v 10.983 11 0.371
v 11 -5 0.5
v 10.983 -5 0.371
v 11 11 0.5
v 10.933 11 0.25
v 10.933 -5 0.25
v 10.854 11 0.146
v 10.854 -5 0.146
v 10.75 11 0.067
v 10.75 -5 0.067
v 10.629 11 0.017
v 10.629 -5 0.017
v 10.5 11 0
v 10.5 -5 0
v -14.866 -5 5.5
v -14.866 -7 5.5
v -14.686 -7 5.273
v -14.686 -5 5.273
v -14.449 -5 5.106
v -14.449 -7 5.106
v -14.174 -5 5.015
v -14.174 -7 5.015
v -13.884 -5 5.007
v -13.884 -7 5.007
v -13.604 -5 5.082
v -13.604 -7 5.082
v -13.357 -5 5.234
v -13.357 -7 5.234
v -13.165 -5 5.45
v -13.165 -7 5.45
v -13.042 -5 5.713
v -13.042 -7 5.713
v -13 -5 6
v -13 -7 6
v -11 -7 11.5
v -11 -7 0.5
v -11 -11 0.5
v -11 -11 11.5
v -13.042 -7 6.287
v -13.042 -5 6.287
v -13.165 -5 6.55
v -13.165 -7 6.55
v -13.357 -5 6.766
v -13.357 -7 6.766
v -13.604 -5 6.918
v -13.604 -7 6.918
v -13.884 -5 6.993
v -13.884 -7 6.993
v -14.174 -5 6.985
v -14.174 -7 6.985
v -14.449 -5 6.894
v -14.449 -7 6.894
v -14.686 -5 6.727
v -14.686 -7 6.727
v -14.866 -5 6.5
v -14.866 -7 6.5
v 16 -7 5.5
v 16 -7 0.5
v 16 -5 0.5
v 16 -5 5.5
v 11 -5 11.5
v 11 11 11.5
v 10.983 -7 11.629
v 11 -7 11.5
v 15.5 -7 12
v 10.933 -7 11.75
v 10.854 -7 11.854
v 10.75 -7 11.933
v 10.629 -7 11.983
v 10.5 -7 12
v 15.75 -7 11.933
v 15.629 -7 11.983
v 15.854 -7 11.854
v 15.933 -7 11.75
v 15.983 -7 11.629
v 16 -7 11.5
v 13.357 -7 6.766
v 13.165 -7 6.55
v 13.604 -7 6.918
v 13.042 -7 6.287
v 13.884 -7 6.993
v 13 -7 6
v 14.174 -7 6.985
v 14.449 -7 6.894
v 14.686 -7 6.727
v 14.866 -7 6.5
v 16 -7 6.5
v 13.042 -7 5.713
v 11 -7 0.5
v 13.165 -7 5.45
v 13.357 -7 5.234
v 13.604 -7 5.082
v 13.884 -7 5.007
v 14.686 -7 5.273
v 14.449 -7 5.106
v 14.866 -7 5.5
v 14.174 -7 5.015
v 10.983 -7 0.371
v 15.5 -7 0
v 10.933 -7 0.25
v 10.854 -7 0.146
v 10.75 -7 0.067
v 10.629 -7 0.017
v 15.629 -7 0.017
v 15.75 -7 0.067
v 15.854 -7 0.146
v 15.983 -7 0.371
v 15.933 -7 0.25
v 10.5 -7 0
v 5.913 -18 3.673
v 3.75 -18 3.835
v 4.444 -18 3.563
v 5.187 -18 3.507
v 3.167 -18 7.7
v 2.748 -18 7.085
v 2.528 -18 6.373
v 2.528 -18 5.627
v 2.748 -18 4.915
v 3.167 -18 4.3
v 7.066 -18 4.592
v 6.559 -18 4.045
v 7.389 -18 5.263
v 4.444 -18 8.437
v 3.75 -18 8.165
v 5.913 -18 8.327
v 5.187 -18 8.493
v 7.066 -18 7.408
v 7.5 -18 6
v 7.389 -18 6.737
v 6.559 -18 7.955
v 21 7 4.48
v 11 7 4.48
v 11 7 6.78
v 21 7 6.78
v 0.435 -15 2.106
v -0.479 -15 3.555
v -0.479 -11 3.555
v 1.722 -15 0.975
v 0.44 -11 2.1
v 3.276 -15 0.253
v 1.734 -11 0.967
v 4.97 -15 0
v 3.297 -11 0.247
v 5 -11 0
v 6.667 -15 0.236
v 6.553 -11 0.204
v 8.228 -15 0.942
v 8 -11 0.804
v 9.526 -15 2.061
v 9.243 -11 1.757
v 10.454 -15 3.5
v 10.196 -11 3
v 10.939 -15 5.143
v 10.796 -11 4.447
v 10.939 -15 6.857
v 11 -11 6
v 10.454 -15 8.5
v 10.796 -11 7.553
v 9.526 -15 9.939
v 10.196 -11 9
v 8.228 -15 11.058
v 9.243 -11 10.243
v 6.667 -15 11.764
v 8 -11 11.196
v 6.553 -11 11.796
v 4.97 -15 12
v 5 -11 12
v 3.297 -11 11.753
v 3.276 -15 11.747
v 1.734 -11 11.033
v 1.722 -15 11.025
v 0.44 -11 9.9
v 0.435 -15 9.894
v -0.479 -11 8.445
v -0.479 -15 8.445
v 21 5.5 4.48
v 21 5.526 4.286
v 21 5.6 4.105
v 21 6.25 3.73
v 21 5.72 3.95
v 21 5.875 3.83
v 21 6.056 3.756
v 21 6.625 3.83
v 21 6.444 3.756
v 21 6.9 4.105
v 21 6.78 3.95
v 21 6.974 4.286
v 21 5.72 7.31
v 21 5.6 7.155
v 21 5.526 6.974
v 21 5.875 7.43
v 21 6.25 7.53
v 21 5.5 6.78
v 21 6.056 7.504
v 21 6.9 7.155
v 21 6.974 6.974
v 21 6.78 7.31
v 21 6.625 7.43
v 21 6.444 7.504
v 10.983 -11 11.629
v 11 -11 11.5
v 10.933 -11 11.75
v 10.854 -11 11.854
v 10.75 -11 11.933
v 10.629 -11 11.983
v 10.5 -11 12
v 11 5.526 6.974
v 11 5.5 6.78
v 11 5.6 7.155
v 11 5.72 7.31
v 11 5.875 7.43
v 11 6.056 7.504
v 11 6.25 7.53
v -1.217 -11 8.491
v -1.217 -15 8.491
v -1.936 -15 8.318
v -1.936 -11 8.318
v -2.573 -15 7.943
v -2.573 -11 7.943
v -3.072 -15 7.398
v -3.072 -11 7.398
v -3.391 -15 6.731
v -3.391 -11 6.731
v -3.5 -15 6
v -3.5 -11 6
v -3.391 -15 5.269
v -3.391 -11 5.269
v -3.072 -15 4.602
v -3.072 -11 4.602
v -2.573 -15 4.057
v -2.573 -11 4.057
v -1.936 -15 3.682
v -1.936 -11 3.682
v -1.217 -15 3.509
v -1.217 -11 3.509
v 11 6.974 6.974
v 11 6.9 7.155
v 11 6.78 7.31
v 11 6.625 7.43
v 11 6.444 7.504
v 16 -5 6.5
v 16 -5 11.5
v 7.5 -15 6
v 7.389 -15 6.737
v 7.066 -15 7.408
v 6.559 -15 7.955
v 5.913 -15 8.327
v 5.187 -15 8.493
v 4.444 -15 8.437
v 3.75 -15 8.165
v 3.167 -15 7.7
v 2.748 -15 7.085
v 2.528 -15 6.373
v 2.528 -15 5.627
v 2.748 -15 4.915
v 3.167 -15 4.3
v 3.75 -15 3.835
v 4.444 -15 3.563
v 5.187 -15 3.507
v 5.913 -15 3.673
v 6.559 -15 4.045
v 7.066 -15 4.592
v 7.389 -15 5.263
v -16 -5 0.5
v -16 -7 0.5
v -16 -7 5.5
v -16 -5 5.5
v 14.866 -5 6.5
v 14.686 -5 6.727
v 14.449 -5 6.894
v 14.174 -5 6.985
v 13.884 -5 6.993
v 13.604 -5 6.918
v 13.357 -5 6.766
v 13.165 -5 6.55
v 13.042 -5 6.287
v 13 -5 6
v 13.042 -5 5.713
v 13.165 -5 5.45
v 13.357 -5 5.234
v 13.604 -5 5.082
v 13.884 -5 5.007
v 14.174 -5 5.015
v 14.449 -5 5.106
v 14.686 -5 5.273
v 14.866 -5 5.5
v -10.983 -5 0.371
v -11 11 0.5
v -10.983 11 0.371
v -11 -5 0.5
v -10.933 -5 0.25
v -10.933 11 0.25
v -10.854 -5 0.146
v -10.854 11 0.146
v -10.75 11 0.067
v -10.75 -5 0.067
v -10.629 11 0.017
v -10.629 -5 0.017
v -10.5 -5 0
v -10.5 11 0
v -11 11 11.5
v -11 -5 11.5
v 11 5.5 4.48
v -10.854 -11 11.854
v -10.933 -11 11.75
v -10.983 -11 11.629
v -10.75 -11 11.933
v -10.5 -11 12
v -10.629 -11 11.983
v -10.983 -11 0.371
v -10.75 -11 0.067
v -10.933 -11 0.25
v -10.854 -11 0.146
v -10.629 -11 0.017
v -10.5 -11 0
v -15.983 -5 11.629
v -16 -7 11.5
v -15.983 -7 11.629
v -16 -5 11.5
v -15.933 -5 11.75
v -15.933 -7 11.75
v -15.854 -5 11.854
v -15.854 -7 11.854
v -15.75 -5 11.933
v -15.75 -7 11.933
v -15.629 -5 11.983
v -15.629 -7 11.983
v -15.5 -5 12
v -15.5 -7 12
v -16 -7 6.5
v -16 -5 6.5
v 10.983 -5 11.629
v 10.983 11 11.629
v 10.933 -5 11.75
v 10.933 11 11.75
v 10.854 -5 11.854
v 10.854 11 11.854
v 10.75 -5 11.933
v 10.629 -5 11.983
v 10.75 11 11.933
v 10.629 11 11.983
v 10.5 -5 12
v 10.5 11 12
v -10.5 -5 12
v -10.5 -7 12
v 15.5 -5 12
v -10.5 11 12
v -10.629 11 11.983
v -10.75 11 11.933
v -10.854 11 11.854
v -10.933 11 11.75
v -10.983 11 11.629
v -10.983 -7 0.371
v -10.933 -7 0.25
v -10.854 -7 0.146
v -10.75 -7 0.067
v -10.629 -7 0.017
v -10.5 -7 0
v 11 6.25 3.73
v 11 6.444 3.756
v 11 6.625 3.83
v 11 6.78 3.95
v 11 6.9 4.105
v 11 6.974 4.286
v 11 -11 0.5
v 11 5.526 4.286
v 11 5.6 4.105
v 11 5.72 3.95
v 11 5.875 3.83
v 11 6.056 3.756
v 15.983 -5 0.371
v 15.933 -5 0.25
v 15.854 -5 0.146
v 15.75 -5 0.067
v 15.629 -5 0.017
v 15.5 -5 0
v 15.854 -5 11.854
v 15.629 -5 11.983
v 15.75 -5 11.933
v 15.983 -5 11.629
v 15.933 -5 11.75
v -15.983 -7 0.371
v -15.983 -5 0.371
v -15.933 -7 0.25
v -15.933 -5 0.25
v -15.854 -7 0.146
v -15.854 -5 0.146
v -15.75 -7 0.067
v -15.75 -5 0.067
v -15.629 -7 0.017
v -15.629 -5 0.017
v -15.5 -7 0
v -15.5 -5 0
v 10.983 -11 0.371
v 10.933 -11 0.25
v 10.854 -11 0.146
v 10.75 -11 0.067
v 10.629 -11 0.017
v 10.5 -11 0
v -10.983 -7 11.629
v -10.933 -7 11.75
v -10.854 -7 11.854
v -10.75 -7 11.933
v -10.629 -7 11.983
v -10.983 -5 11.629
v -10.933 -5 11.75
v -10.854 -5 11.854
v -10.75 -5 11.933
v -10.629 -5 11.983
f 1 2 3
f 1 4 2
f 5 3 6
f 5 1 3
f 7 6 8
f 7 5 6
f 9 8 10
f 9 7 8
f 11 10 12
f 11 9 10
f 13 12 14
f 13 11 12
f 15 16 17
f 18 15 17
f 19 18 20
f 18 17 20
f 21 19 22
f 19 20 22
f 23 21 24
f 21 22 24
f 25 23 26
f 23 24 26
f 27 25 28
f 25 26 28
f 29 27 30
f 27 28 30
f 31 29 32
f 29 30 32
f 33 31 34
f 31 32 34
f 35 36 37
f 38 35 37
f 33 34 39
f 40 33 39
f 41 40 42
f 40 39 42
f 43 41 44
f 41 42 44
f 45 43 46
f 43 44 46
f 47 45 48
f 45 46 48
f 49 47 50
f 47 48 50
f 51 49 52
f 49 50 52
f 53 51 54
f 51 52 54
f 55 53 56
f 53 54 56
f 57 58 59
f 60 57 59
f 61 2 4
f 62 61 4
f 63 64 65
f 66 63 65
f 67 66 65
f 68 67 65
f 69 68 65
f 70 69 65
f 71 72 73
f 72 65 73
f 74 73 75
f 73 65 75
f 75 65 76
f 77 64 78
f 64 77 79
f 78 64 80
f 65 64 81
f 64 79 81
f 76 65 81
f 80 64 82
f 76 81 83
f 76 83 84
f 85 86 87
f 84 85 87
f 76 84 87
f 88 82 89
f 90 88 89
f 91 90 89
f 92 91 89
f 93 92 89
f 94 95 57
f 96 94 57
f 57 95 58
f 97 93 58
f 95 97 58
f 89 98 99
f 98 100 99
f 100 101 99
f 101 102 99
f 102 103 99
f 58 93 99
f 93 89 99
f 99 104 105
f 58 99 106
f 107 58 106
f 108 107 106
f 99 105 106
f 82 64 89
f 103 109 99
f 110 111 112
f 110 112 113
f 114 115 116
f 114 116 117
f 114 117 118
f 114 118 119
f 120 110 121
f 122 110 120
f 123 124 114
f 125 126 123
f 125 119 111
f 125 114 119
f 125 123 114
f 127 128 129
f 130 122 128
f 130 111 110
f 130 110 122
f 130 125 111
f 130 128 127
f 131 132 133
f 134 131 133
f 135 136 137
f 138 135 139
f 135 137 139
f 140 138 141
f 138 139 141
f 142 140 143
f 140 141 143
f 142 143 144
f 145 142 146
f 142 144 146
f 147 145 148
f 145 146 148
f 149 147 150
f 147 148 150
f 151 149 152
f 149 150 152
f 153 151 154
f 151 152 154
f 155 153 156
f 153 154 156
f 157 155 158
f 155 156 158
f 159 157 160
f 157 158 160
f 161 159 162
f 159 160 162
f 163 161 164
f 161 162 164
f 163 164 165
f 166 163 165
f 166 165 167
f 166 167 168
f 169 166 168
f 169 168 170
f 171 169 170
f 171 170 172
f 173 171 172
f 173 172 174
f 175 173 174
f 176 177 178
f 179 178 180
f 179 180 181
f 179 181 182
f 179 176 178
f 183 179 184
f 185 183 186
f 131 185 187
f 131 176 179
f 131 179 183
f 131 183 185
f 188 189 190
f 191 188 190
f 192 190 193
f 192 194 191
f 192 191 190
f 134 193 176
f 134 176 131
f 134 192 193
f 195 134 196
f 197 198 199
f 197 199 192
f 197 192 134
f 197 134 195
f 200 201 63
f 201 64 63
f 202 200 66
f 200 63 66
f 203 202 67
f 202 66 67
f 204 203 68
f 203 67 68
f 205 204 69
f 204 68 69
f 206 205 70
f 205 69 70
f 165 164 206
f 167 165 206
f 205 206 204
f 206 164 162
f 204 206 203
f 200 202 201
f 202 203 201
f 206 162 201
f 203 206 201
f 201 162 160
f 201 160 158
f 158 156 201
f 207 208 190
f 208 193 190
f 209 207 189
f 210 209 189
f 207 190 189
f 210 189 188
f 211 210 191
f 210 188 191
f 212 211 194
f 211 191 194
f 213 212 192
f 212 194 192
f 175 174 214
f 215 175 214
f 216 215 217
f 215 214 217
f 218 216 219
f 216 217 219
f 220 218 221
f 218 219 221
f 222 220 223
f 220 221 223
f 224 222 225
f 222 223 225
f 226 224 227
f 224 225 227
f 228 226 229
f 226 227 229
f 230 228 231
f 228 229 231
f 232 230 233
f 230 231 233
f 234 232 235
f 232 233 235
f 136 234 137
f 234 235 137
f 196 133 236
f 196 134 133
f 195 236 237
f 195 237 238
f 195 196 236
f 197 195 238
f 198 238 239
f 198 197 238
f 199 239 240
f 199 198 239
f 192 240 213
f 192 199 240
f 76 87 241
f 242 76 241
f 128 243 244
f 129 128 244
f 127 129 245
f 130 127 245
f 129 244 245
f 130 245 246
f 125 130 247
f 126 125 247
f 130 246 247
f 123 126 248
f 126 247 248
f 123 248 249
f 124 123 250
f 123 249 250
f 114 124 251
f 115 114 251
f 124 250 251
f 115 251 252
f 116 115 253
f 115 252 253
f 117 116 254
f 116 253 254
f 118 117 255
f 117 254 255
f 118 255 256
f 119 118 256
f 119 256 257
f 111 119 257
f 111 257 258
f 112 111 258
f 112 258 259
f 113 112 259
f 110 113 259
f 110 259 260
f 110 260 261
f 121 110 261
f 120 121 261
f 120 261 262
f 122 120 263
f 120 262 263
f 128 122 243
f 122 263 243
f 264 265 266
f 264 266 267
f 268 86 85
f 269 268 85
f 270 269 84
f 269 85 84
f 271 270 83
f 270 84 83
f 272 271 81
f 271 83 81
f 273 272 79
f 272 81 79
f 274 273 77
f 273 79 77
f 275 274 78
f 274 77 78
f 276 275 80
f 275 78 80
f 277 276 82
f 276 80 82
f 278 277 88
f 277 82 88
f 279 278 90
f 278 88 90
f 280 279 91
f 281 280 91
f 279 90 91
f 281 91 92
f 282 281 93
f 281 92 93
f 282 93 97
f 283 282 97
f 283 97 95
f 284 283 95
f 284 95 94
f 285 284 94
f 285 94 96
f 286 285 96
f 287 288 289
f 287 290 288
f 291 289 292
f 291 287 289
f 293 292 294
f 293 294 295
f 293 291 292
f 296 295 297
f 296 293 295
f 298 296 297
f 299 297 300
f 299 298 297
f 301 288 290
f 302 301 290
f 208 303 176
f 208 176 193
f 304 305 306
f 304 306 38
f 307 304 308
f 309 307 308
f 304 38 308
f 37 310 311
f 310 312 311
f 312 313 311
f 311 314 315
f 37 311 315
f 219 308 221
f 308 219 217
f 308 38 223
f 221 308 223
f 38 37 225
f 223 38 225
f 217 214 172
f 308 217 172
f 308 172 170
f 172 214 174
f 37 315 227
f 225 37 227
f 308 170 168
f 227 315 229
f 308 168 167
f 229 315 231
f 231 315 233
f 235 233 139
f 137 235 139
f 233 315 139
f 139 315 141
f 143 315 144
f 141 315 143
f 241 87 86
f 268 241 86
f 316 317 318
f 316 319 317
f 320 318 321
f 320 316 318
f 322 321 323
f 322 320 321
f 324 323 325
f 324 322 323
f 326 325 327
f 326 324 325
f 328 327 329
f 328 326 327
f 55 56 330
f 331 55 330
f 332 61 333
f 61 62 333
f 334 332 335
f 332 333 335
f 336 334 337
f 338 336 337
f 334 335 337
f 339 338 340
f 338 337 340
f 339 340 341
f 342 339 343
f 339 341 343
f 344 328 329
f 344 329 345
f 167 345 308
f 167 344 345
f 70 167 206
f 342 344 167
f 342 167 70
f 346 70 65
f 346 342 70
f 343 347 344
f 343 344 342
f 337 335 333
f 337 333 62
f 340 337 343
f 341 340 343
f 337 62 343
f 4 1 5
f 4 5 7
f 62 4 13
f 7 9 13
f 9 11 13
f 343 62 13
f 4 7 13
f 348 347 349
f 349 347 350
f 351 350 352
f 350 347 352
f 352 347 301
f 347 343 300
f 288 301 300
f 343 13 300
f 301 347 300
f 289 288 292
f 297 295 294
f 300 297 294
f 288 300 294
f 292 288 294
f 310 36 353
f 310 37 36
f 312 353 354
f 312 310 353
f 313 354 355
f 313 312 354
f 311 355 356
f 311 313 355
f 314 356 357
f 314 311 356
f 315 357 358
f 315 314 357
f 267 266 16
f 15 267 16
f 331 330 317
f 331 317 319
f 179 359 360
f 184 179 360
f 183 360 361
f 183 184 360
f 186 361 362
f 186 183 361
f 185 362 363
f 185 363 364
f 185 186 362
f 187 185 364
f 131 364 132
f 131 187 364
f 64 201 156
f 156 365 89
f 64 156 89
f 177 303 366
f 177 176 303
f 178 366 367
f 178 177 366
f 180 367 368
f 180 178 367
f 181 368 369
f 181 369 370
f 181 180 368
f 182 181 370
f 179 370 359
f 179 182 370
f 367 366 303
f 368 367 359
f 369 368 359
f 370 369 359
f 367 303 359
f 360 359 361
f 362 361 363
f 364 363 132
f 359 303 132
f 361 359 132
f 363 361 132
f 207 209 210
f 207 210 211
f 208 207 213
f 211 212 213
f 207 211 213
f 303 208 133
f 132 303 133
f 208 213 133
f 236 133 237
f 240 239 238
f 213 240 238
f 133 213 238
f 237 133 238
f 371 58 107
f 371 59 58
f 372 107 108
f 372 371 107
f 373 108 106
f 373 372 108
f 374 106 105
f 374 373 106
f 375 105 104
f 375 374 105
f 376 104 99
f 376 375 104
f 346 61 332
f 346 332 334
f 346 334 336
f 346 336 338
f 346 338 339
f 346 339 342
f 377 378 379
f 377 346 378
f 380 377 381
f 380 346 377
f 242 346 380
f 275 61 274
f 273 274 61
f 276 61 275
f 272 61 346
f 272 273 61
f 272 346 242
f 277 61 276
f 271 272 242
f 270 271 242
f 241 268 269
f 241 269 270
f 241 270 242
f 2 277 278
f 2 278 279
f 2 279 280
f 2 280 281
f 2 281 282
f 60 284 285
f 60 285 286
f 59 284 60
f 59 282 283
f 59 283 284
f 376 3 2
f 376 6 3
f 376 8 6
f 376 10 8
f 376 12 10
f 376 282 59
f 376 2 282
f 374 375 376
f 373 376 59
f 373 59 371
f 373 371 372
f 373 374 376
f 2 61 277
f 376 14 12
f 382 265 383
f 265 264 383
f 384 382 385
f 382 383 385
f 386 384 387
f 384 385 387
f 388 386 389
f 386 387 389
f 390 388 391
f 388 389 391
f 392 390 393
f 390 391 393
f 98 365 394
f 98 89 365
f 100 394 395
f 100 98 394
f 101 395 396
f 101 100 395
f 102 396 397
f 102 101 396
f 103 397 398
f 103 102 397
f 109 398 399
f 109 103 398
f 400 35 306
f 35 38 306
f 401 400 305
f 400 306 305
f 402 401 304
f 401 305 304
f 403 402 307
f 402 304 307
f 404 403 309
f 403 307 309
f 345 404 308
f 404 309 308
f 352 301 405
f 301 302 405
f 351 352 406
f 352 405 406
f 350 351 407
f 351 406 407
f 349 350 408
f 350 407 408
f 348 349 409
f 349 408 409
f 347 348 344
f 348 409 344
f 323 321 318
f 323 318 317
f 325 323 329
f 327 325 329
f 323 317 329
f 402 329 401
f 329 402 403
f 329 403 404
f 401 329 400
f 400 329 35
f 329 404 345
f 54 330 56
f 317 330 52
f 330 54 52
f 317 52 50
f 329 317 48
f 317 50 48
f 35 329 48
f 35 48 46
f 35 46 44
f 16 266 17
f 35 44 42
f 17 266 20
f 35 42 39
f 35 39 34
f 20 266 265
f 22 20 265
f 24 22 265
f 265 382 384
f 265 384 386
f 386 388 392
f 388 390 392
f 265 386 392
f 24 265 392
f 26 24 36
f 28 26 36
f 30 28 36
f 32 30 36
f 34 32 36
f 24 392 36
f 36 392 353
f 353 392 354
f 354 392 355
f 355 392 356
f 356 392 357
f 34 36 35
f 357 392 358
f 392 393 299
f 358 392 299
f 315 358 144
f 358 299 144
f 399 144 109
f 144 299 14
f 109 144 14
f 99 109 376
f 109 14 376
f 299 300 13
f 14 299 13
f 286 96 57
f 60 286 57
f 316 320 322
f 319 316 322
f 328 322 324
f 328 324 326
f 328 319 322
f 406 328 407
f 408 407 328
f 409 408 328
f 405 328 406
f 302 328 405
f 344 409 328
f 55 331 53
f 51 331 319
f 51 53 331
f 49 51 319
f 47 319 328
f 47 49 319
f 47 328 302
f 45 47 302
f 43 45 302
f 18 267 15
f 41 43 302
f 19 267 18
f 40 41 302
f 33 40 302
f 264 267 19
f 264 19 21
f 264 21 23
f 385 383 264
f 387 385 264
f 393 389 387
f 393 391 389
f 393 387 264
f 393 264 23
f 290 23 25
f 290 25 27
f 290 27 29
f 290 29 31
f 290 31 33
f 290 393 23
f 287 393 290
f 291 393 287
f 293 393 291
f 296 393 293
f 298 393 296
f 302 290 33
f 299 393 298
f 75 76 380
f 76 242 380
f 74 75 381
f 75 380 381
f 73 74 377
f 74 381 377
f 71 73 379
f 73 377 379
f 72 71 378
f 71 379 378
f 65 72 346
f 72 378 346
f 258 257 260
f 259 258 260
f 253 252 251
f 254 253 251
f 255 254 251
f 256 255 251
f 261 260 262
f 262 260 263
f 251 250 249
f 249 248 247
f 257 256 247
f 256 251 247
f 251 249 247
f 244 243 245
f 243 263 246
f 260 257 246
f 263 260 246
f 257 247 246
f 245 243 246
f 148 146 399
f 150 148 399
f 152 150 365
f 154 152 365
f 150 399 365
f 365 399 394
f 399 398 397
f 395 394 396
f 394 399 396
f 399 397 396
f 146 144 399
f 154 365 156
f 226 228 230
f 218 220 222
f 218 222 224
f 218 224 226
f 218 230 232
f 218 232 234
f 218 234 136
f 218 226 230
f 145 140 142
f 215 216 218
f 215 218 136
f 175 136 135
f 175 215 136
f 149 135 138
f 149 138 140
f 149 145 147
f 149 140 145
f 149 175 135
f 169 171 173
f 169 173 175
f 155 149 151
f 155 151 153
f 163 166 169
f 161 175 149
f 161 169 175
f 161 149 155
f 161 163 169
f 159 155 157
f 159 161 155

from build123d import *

# Parameters (mm, degrees)
F0_W      = 5
F0_H      = 2
F1_DEPTH  = 12
F2_R      = 0.5
F4_DEPTH  = 4
F5_R      = 2.5
F6_DEPTH  = 3
F7_W      = 1.5
F7_H      = 3.8
F8_DEPTH  = 10
F9_R      = 0.74999
F11_DEPTH = 2


# Not quite as in the source:
# - a fillet or chamfer is up to 0.001 mm smaller than in the source, because OpenCascade refuses the exact size


with BuildPart() as f1:
    # F0 (on Top) → F1 (new body)
    with BuildSketch(Plane.XY):
        Polygon((-11, -11), (11, -11), (11, -7), (11, -5), (11, 11), (-11, 11), (-11, -5), (-11, -7), align=None)
        with Locations((13.5, -6)):
            Rectangle(F0_W, F0_H)
        with Locations((-13.5, -6)):
            Rectangle(F0_W, F0_H)
    extrude(amount=F1_DEPTH)

    # F2
    f2_edges = [f1.edges().sort_by_distance(p)[0] for p in [
        (11, 3, 12),
        (11, -9, 12),
        (-11, -9, 12),
        (16, -6, 12),
        (-11, 3, 12),
        (-16, -6, 12),
        (-11, 3, 0),
        (-11, -9, 0),
        (-16, -6, 0),
        (11, -9, 0),
        (11, 3, 0),
        (16, -6, 0),
    ]]
    fillet(f2_edges, radius=F2_R)

    # F3 (on face) → F4 (join)
    with BuildSketch(Plane.XZ.offset(11)):
        with BuildLine():
            ThreePointArc((-0.4791666667, 3.5548552929), (6.25, 0.1316527028), (11, 6))
            ThreePointArc((11, 6), (6.25, 11.8683472972), (-0.4791666667, 8.4451447071))
            ThreePointArc((-0.4791666667, 8.4451447071), (0.9432039694, 7.572882174), (1.5, 6))
            ThreePointArc((1.5, 6), (0.9432039694, 4.427117826), (-0.4791666667, 3.5548552929))
        make_face()
        with BuildLine():
            ThreePointArc((1.5, 6), (0.9432039694, 7.572882174), (-0.4791666667, 8.4451447071))
            ThreePointArc((-0.4791666667, 8.4451447071), (-1, 6), (-0.4791666667, 3.5548552929))
            ThreePointArc((-0.4791666667, 3.5548552929), (0.9432039694, 4.427117826), (1.5, 6))
        make_face()
        with BuildLine():
            ThreePointArc((-0.4791666667, 3.5548552929), (-1, 6), (-0.4791666667, 8.4451447071))
            ThreePointArc((-0.4791666667, 8.4451447071), (-3.5, 6), (-0.4791666667, 3.5548552929))
        make_face()
    extrude(amount=F4_DEPTH)

    # F10 (on face) → F11 (cut, through all)
    with BuildSketch(Plane.XZ.offset(7)):
        with BuildLine():
            ThreePointArc((14.8660254038, 5.5), (14.9659258263, 5.7411809549), (15, 6))
            ThreePointArc((15, 6), (14.9659258263, 6.2588190451), (14.8660254038, 6.5))
            Line((14.8660254038, 6.5), (14, 6.5))
            Line((14, 6.5), (14, 5.5))
            Line((14, 5.5), (14.8660254038, 5.5))
        make_face()
        with BuildLine():
            Line((14, 6.5), (14.8660254038, 6.5))
            ThreePointArc((14.8660254038, 6.5), (13, 6), (14.8660254038, 5.5))
            Line((14.8660254038, 5.5), (14, 5.5))
            Line((14, 5.5), (14, 6.5))
        make_face()
        with BuildLine():
            ThreePointArc((14.8660254038, 6.5), (14.9659258263, 6.2588190451), (15, 6))
            ThreePointArc((15, 6), (14.9659258263, 5.7411809549), (14.8660254038, 5.5))
            Line((14.8660254038, 5.5), (16, 5.5))
            Line((16, 5.5), (16, 6.5))
            Line((16, 6.5), (14.8660254038, 6.5))
        make_face()
        with BuildLine():
            Line((-14.8660254038, 6.5), (-14, 6.5))
            Line((-14, 6.5), (-14, 5.5))
            Line((-14, 5.5), (-14.8660254038, 5.5))
            ThreePointArc((-14.8660254038, 5.5), (-13.7411809549, 5.0340741737), (-13, 6))
            ThreePointArc((-13, 6), (-13.7411809549, 6.9659258263), (-14.8660254038, 6.5))
        make_face()
        with BuildLine():
            ThreePointArc((-14.8660254038, 5.5), (-15, 6), (-14.8660254038, 6.5))
            Line((-14.8660254038, 6.5), (-16, 6.5))
            Line((-16, 6.5), (-16, 5.5))
            Line((-16, 5.5), (-14.8660254038, 5.5))
        make_face()
        with BuildLine():
            Line((-14, 5.5), (-14, 6.5))
            Line((-14, 6.5), (-14.8660254038, 6.5))
            ThreePointArc((-14.8660254038, 6.5), (-15, 6), (-14.8660254038, 5.5))
            Line((-14.8660254038, 5.5), (-14, 5.5))
        make_face()
    extrude(amount=-F11_DEPTH, mode=Mode.SUBTRACT)


with BuildPart() as f6:
    # F5 (on face) → F6 (new body)
    with BuildSketch(Plane.XZ.offset(15)):
        with Locations((5, 6)):
            Circle(F5_R)
    extrude(amount=F6_DEPTH)


with BuildPart() as f8:
    # F7 (on face) → F8 (new body)
    with BuildSketch(Plane.YZ.offset(11)):
        with Locations((6.25, 5.6300098076)):
            Rectangle(F7_W, F7_H)
    extrude(amount=F8_DEPTH)

    # F9 (radius 0.75 in the source; OpenCascade refuses exactly that, so slightly less here)
    f9_edges = [f8.edges().sort_by_distance(p)[0] for p in [
        (16, 5.5, 7.53001),
        (16, 7, 7.53001),
        (16, 5.5, 3.73001),
        (16, 7, 3.73001),
    ]]
    fillet(f9_edges, radius=F9_R)


solid = Compound([f1.part, f6.part, f8.part])
